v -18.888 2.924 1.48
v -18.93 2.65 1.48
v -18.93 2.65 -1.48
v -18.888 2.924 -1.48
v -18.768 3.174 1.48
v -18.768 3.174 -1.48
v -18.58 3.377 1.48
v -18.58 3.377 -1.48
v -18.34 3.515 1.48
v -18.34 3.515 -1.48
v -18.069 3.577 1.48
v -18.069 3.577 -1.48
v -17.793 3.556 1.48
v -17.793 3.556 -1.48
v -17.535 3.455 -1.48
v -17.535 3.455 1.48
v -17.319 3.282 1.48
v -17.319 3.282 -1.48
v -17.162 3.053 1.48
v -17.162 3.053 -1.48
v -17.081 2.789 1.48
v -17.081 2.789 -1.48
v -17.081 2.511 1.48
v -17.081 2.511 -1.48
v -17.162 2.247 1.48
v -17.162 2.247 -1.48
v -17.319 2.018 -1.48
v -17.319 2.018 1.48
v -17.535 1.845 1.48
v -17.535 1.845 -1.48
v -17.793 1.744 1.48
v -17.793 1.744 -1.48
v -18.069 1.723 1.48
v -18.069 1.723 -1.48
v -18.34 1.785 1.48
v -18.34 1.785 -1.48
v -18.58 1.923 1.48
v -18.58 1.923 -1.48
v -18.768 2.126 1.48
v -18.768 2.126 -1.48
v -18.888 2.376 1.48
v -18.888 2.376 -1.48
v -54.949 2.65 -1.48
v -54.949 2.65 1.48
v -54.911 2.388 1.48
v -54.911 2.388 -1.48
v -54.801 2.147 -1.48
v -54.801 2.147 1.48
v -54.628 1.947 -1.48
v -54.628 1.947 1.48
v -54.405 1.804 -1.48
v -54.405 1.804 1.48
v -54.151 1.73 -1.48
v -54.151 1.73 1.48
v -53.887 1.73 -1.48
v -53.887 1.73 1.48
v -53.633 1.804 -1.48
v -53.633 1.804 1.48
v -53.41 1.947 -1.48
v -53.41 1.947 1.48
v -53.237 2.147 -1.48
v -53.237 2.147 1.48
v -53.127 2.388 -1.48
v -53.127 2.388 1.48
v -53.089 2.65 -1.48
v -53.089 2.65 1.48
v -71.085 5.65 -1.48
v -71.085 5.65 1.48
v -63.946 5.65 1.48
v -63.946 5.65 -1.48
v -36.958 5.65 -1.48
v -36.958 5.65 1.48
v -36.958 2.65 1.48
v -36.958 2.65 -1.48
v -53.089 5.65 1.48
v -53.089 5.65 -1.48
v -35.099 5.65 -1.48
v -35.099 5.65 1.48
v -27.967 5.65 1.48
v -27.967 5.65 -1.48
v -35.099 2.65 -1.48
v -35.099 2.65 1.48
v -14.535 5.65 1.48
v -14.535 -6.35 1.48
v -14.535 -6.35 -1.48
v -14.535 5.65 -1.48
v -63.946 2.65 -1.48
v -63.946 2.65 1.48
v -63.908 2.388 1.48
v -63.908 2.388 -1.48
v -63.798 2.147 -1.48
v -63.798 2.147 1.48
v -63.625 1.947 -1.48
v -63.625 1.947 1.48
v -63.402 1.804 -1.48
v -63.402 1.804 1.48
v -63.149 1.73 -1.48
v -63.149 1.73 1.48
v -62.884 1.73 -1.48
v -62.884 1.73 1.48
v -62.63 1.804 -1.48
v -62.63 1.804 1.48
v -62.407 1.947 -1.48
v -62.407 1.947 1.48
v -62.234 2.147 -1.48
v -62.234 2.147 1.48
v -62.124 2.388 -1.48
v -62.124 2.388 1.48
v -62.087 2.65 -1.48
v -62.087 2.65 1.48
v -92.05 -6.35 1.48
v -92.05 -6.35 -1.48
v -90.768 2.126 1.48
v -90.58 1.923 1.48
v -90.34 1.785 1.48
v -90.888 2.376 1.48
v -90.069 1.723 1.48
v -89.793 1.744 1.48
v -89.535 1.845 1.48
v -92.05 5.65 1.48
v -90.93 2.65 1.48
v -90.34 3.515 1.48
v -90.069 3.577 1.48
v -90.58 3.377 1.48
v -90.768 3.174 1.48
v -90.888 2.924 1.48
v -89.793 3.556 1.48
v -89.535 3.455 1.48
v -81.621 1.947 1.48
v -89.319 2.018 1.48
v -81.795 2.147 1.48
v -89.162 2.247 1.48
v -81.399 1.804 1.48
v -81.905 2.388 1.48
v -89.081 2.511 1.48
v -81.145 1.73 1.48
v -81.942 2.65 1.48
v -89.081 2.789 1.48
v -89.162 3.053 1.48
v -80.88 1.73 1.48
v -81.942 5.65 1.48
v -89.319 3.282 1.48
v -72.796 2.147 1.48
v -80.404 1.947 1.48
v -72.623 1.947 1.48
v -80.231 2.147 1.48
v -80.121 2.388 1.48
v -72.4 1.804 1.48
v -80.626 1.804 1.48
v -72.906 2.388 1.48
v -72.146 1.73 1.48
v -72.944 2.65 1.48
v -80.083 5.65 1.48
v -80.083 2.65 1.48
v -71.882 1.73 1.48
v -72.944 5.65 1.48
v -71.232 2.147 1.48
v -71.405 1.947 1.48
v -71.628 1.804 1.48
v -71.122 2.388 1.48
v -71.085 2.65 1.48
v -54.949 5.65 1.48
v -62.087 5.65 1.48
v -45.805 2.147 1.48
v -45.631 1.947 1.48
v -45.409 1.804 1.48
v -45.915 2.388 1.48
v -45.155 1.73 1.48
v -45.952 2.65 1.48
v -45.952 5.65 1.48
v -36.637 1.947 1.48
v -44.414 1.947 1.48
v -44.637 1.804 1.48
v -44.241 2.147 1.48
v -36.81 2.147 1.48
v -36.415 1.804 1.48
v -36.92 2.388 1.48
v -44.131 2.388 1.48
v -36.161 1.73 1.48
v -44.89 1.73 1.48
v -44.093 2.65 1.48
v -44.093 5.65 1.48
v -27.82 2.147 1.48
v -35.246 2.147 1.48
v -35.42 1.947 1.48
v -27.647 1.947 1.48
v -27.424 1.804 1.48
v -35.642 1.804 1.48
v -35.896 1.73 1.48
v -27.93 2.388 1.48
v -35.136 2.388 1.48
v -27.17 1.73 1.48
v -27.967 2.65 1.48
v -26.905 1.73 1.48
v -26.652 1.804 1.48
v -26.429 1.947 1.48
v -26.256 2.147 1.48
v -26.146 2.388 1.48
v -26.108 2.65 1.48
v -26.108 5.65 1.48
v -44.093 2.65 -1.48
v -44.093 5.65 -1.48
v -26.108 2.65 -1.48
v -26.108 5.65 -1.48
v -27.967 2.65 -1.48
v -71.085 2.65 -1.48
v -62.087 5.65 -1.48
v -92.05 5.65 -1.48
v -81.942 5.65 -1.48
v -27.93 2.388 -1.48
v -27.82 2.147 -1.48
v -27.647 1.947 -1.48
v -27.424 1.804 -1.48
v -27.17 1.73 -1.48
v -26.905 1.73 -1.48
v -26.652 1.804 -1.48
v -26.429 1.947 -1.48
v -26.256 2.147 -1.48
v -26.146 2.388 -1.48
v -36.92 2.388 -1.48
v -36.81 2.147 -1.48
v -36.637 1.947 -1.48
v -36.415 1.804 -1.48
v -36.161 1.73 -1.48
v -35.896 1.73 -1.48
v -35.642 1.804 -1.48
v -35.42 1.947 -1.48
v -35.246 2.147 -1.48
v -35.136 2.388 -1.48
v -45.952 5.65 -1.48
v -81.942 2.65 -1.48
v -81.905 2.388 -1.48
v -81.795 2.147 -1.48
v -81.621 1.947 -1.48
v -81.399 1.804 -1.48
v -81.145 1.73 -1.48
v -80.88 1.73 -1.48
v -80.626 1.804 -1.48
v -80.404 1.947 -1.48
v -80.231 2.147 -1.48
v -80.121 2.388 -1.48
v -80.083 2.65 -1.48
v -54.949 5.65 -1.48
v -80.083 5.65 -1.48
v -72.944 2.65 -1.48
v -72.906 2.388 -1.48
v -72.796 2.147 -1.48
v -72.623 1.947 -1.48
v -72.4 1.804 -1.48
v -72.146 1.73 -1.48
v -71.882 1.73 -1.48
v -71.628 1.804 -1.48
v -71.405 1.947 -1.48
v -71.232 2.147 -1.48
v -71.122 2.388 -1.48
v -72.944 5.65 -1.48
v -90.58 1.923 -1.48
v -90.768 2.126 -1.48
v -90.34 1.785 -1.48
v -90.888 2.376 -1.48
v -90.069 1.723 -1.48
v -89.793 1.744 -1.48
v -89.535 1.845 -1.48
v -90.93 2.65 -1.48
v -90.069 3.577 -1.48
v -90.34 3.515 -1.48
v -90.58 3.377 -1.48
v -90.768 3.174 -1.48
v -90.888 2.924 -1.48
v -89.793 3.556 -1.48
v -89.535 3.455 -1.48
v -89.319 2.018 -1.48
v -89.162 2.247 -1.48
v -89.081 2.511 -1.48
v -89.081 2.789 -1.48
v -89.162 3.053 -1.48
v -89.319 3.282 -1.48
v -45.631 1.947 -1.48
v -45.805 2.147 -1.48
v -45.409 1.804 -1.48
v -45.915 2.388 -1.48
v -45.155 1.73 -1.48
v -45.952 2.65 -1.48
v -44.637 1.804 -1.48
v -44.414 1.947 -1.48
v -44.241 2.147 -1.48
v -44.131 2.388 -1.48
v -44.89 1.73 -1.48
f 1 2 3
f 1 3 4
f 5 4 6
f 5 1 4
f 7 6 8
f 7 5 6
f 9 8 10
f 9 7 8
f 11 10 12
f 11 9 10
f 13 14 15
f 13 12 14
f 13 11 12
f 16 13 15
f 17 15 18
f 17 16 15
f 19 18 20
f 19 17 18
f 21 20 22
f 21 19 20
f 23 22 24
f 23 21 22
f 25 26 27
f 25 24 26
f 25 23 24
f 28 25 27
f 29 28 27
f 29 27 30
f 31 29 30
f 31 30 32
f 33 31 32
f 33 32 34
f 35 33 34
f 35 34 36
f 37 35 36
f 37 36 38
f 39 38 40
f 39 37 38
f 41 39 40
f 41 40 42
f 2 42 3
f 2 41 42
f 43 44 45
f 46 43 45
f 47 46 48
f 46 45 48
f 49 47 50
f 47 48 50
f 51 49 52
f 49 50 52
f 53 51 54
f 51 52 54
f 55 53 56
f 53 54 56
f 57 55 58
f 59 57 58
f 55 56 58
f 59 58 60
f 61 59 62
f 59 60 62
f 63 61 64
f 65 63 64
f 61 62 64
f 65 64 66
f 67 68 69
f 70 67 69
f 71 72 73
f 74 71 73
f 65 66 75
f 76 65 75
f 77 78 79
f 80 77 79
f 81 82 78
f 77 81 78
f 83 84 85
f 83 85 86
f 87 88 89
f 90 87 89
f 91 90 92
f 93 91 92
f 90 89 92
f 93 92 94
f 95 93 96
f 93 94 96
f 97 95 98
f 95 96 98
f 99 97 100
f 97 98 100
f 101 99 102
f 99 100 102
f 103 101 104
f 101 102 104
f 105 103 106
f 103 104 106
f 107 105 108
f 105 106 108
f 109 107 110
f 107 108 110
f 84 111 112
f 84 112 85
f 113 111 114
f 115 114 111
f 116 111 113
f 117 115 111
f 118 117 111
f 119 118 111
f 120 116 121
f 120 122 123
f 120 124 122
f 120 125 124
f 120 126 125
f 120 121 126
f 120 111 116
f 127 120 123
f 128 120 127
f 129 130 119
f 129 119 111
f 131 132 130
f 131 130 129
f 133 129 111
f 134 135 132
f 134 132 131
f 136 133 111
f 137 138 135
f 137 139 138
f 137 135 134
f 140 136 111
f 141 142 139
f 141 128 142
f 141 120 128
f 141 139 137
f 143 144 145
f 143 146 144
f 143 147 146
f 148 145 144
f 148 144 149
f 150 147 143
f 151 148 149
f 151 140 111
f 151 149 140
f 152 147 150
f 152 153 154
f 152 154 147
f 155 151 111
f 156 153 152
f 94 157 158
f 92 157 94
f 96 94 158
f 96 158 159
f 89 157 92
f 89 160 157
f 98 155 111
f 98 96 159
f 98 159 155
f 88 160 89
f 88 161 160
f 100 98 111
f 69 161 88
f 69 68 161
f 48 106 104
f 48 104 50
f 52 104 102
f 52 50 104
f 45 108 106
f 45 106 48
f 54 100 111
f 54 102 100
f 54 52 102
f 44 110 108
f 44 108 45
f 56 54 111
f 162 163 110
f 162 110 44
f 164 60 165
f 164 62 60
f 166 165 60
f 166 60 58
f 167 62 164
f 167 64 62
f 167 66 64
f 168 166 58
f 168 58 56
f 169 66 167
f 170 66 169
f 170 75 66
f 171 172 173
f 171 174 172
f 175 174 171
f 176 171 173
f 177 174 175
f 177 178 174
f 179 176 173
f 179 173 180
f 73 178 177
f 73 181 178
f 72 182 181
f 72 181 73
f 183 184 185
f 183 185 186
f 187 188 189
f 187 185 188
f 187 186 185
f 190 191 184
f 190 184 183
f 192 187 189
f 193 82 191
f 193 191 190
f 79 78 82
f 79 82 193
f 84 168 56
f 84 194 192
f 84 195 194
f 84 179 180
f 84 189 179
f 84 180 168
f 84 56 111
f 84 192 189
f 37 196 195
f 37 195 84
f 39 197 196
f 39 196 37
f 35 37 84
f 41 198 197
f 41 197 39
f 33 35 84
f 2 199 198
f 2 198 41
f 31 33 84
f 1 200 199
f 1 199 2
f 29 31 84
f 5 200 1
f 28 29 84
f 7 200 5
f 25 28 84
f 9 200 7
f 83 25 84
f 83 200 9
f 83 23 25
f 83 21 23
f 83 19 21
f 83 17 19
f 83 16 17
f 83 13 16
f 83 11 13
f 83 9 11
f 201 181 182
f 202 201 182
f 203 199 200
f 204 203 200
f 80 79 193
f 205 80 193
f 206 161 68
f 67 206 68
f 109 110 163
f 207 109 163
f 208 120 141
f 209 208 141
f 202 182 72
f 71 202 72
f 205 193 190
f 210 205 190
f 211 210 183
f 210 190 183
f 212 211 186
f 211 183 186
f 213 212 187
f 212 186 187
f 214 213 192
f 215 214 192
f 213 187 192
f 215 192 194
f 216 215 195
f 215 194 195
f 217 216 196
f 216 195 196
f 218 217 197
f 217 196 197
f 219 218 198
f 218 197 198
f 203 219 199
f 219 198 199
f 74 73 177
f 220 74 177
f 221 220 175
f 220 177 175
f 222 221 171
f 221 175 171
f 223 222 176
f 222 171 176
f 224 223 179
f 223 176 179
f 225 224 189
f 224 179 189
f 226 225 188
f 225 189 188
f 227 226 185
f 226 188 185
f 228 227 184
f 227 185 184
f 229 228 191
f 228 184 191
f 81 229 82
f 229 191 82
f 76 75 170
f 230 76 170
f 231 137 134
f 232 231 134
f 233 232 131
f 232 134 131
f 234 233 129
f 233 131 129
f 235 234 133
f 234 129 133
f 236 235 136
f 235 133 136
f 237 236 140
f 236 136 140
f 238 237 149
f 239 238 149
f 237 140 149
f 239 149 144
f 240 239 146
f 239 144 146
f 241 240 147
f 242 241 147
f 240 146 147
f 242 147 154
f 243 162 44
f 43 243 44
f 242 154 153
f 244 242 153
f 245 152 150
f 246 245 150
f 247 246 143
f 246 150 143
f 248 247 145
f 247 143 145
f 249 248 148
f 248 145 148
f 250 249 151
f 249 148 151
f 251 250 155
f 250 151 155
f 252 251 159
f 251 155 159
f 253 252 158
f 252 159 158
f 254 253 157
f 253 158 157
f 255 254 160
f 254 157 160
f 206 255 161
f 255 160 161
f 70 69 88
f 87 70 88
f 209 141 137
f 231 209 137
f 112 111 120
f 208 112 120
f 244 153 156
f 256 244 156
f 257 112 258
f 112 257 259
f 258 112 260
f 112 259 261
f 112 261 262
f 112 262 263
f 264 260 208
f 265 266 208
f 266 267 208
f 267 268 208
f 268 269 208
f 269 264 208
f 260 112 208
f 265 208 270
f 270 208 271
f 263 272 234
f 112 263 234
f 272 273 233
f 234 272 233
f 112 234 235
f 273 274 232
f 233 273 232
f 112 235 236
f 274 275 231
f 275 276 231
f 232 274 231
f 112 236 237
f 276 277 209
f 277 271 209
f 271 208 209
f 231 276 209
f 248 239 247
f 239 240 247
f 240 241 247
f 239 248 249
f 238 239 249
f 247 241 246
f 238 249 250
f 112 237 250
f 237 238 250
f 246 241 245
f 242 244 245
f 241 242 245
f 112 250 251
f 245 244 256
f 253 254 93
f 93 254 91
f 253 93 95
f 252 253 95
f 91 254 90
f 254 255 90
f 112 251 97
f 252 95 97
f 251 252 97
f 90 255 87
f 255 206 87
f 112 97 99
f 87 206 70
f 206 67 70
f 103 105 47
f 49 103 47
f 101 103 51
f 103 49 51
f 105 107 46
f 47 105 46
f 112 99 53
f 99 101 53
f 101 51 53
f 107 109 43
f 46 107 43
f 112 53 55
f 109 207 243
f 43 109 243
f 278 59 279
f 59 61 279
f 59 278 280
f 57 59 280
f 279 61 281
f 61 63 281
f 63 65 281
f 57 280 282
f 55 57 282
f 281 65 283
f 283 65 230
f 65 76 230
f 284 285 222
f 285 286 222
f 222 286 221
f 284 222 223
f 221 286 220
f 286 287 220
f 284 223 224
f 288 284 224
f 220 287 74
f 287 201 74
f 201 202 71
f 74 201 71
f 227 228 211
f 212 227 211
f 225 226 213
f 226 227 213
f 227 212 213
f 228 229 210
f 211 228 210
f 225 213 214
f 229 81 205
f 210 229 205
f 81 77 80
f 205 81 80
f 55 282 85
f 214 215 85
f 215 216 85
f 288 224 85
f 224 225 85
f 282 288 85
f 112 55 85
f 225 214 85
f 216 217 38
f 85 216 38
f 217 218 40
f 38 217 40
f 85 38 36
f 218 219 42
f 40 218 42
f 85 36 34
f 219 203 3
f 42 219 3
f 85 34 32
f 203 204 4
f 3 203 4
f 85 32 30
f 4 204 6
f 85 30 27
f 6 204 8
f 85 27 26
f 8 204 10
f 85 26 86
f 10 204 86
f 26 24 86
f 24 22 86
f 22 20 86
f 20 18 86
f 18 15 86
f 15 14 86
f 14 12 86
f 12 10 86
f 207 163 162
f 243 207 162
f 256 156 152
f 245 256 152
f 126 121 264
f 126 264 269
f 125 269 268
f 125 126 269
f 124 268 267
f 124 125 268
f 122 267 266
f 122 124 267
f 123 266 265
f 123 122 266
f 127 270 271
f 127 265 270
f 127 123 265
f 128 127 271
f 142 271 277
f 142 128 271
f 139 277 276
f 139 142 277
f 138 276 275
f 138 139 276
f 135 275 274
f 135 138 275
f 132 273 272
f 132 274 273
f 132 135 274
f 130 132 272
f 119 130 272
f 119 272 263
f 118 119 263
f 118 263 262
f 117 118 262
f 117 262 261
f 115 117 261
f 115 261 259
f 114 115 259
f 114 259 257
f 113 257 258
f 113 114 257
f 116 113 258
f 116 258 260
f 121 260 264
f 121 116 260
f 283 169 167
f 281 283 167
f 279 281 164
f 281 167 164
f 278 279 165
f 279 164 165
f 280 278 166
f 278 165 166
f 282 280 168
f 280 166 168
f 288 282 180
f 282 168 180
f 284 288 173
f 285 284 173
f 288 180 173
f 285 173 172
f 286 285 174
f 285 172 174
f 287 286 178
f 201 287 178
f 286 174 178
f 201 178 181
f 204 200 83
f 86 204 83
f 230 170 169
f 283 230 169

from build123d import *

# Parameters (mm, degrees)
SKETCH1_W               = 77.514562268
SKETCH1_H               = 12
BOSS_EXTRUDE1_DEPTH     = 1.47955
CUT_EXTRUDE1_DEPTH      = 93.316205492
CUT_EXTRUDE1_DEPTH_BACK = 93.316205492
SKETCH3_R               = 0.92964


with BuildPart() as part:
    # Sketch1 → Boss-Extrude1 (new, symmetric)
    with BuildSketch(Plane.XY):
        with Locations((-53.29272171, -0.35)):
            Rectangle(SKETCH1_W, SKETCH1_H)
    extrude(amount=BOSS_EXTRUDE1_DEPTH, both=True)

    # Sketch3 → Cut-Extrude1 (cut, two sides: drawn at the far end of the back side and taken through both)
    with BuildSketch(Plane(origin=(0, 0, -1.47955), x_dir=(-1, 0, 0), z_dir=(0, 0, -1)).offset(-CUT_EXTRUDE1_DEPTH_BACK)):
        with Locations((18.000000576, 2.65)):
            Circle(SKETCH3_R)
        with Locations((90.00000288, 2.65)):
            Circle(SKETCH3_R)
        with BuildLine():
            Line((26.1081454, 2.65), (26.1081454, 5.65))
            Line((26.1081454, 5.65), (27.9674254, 5.65))
            Line((27.9674254, 5.65), (27.9674254, 2.65))
            ThreePointArc((27.9674254, 2.65), (27.0377854, 1.72036), (26.1081454, 2.65))
        make_face()
        with BuildLine():
            Line((35.09872244, 2.65), (35.09872244, 5.65))
            Line((35.09872244, 5.65), (36.95800244, 5.65))
            Line((36.95800244, 5.65), (36.95800244, 2.65))
            ThreePointArc((36.95800244, 2.65), (36.02836244, 1.72036), (35.09872244, 2.65))
        make_face()
        with BuildLine():
            Line((44.093057534, 2.65), (44.093057534, 5.65))
            Line((44.093057534, 5.65), (45.952337534, 5.65))
            Line((45.952337534, 5.65), (45.952337534, 2.65))
            ThreePointArc((45.952337534, 2.65), (45.022697534, 1.72036), (44.093057534, 2.65))
        make_face()
        with BuildLine():
            Line((53.089277696, 2.65), (53.089277696, 5.65))
            Line((53.089277696, 5.65), (54.948557696, 5.65))
            Line((54.948557696, 5.65), (54.948557696, 2.65))
            ThreePointArc((54.948557696, 2.65), (54.018917696, 1.72036), (53.089277696, 2.65))
        make_face()
        with BuildLine():
            Line((62.086576691, 2.65), (62.086576691, 5.65))
            Line((62.086576691, 5.65), (63.945856691, 5.65))
            Line((63.945856691, 5.65), (63.945856691, 2.65))
            ThreePointArc((63.945856691, 2.65), (63.016216691, 1.72036), (62.086576691, 2.65))
        make_face()
        with BuildLine():
            Line((71.084550518, 2.65), (71.084550518, 5.65))
            Line((71.084550518, 5.65), (72.943830518, 5.65))
            Line((72.943830518, 5.65), (72.943830518, 2.65))
            ThreePointArc((72.943830518, 2.65), (72.014190518, 1.72036), (71.084550518, 2.65))
        make_face()
        with BuildLine():
            Line((80.08297445, 2.65), (80.08297445, 5.65))
            Line((80.08297445, 5.65), (81.94225445, 5.65))
            Line((81.94225445, 5.65), (81.94225445, 2.65))
            ThreePointArc((81.94225445, 2.65), (81.01261445, 1.72036), (80.08297445, 2.65))
        make_face()
    extrude(amount=CUT_EXTRUDE1_DEPTH + CUT_EXTRUDE1_DEPTH_BACK, mode=Mode.SUBTRACT)


solid = part.part
